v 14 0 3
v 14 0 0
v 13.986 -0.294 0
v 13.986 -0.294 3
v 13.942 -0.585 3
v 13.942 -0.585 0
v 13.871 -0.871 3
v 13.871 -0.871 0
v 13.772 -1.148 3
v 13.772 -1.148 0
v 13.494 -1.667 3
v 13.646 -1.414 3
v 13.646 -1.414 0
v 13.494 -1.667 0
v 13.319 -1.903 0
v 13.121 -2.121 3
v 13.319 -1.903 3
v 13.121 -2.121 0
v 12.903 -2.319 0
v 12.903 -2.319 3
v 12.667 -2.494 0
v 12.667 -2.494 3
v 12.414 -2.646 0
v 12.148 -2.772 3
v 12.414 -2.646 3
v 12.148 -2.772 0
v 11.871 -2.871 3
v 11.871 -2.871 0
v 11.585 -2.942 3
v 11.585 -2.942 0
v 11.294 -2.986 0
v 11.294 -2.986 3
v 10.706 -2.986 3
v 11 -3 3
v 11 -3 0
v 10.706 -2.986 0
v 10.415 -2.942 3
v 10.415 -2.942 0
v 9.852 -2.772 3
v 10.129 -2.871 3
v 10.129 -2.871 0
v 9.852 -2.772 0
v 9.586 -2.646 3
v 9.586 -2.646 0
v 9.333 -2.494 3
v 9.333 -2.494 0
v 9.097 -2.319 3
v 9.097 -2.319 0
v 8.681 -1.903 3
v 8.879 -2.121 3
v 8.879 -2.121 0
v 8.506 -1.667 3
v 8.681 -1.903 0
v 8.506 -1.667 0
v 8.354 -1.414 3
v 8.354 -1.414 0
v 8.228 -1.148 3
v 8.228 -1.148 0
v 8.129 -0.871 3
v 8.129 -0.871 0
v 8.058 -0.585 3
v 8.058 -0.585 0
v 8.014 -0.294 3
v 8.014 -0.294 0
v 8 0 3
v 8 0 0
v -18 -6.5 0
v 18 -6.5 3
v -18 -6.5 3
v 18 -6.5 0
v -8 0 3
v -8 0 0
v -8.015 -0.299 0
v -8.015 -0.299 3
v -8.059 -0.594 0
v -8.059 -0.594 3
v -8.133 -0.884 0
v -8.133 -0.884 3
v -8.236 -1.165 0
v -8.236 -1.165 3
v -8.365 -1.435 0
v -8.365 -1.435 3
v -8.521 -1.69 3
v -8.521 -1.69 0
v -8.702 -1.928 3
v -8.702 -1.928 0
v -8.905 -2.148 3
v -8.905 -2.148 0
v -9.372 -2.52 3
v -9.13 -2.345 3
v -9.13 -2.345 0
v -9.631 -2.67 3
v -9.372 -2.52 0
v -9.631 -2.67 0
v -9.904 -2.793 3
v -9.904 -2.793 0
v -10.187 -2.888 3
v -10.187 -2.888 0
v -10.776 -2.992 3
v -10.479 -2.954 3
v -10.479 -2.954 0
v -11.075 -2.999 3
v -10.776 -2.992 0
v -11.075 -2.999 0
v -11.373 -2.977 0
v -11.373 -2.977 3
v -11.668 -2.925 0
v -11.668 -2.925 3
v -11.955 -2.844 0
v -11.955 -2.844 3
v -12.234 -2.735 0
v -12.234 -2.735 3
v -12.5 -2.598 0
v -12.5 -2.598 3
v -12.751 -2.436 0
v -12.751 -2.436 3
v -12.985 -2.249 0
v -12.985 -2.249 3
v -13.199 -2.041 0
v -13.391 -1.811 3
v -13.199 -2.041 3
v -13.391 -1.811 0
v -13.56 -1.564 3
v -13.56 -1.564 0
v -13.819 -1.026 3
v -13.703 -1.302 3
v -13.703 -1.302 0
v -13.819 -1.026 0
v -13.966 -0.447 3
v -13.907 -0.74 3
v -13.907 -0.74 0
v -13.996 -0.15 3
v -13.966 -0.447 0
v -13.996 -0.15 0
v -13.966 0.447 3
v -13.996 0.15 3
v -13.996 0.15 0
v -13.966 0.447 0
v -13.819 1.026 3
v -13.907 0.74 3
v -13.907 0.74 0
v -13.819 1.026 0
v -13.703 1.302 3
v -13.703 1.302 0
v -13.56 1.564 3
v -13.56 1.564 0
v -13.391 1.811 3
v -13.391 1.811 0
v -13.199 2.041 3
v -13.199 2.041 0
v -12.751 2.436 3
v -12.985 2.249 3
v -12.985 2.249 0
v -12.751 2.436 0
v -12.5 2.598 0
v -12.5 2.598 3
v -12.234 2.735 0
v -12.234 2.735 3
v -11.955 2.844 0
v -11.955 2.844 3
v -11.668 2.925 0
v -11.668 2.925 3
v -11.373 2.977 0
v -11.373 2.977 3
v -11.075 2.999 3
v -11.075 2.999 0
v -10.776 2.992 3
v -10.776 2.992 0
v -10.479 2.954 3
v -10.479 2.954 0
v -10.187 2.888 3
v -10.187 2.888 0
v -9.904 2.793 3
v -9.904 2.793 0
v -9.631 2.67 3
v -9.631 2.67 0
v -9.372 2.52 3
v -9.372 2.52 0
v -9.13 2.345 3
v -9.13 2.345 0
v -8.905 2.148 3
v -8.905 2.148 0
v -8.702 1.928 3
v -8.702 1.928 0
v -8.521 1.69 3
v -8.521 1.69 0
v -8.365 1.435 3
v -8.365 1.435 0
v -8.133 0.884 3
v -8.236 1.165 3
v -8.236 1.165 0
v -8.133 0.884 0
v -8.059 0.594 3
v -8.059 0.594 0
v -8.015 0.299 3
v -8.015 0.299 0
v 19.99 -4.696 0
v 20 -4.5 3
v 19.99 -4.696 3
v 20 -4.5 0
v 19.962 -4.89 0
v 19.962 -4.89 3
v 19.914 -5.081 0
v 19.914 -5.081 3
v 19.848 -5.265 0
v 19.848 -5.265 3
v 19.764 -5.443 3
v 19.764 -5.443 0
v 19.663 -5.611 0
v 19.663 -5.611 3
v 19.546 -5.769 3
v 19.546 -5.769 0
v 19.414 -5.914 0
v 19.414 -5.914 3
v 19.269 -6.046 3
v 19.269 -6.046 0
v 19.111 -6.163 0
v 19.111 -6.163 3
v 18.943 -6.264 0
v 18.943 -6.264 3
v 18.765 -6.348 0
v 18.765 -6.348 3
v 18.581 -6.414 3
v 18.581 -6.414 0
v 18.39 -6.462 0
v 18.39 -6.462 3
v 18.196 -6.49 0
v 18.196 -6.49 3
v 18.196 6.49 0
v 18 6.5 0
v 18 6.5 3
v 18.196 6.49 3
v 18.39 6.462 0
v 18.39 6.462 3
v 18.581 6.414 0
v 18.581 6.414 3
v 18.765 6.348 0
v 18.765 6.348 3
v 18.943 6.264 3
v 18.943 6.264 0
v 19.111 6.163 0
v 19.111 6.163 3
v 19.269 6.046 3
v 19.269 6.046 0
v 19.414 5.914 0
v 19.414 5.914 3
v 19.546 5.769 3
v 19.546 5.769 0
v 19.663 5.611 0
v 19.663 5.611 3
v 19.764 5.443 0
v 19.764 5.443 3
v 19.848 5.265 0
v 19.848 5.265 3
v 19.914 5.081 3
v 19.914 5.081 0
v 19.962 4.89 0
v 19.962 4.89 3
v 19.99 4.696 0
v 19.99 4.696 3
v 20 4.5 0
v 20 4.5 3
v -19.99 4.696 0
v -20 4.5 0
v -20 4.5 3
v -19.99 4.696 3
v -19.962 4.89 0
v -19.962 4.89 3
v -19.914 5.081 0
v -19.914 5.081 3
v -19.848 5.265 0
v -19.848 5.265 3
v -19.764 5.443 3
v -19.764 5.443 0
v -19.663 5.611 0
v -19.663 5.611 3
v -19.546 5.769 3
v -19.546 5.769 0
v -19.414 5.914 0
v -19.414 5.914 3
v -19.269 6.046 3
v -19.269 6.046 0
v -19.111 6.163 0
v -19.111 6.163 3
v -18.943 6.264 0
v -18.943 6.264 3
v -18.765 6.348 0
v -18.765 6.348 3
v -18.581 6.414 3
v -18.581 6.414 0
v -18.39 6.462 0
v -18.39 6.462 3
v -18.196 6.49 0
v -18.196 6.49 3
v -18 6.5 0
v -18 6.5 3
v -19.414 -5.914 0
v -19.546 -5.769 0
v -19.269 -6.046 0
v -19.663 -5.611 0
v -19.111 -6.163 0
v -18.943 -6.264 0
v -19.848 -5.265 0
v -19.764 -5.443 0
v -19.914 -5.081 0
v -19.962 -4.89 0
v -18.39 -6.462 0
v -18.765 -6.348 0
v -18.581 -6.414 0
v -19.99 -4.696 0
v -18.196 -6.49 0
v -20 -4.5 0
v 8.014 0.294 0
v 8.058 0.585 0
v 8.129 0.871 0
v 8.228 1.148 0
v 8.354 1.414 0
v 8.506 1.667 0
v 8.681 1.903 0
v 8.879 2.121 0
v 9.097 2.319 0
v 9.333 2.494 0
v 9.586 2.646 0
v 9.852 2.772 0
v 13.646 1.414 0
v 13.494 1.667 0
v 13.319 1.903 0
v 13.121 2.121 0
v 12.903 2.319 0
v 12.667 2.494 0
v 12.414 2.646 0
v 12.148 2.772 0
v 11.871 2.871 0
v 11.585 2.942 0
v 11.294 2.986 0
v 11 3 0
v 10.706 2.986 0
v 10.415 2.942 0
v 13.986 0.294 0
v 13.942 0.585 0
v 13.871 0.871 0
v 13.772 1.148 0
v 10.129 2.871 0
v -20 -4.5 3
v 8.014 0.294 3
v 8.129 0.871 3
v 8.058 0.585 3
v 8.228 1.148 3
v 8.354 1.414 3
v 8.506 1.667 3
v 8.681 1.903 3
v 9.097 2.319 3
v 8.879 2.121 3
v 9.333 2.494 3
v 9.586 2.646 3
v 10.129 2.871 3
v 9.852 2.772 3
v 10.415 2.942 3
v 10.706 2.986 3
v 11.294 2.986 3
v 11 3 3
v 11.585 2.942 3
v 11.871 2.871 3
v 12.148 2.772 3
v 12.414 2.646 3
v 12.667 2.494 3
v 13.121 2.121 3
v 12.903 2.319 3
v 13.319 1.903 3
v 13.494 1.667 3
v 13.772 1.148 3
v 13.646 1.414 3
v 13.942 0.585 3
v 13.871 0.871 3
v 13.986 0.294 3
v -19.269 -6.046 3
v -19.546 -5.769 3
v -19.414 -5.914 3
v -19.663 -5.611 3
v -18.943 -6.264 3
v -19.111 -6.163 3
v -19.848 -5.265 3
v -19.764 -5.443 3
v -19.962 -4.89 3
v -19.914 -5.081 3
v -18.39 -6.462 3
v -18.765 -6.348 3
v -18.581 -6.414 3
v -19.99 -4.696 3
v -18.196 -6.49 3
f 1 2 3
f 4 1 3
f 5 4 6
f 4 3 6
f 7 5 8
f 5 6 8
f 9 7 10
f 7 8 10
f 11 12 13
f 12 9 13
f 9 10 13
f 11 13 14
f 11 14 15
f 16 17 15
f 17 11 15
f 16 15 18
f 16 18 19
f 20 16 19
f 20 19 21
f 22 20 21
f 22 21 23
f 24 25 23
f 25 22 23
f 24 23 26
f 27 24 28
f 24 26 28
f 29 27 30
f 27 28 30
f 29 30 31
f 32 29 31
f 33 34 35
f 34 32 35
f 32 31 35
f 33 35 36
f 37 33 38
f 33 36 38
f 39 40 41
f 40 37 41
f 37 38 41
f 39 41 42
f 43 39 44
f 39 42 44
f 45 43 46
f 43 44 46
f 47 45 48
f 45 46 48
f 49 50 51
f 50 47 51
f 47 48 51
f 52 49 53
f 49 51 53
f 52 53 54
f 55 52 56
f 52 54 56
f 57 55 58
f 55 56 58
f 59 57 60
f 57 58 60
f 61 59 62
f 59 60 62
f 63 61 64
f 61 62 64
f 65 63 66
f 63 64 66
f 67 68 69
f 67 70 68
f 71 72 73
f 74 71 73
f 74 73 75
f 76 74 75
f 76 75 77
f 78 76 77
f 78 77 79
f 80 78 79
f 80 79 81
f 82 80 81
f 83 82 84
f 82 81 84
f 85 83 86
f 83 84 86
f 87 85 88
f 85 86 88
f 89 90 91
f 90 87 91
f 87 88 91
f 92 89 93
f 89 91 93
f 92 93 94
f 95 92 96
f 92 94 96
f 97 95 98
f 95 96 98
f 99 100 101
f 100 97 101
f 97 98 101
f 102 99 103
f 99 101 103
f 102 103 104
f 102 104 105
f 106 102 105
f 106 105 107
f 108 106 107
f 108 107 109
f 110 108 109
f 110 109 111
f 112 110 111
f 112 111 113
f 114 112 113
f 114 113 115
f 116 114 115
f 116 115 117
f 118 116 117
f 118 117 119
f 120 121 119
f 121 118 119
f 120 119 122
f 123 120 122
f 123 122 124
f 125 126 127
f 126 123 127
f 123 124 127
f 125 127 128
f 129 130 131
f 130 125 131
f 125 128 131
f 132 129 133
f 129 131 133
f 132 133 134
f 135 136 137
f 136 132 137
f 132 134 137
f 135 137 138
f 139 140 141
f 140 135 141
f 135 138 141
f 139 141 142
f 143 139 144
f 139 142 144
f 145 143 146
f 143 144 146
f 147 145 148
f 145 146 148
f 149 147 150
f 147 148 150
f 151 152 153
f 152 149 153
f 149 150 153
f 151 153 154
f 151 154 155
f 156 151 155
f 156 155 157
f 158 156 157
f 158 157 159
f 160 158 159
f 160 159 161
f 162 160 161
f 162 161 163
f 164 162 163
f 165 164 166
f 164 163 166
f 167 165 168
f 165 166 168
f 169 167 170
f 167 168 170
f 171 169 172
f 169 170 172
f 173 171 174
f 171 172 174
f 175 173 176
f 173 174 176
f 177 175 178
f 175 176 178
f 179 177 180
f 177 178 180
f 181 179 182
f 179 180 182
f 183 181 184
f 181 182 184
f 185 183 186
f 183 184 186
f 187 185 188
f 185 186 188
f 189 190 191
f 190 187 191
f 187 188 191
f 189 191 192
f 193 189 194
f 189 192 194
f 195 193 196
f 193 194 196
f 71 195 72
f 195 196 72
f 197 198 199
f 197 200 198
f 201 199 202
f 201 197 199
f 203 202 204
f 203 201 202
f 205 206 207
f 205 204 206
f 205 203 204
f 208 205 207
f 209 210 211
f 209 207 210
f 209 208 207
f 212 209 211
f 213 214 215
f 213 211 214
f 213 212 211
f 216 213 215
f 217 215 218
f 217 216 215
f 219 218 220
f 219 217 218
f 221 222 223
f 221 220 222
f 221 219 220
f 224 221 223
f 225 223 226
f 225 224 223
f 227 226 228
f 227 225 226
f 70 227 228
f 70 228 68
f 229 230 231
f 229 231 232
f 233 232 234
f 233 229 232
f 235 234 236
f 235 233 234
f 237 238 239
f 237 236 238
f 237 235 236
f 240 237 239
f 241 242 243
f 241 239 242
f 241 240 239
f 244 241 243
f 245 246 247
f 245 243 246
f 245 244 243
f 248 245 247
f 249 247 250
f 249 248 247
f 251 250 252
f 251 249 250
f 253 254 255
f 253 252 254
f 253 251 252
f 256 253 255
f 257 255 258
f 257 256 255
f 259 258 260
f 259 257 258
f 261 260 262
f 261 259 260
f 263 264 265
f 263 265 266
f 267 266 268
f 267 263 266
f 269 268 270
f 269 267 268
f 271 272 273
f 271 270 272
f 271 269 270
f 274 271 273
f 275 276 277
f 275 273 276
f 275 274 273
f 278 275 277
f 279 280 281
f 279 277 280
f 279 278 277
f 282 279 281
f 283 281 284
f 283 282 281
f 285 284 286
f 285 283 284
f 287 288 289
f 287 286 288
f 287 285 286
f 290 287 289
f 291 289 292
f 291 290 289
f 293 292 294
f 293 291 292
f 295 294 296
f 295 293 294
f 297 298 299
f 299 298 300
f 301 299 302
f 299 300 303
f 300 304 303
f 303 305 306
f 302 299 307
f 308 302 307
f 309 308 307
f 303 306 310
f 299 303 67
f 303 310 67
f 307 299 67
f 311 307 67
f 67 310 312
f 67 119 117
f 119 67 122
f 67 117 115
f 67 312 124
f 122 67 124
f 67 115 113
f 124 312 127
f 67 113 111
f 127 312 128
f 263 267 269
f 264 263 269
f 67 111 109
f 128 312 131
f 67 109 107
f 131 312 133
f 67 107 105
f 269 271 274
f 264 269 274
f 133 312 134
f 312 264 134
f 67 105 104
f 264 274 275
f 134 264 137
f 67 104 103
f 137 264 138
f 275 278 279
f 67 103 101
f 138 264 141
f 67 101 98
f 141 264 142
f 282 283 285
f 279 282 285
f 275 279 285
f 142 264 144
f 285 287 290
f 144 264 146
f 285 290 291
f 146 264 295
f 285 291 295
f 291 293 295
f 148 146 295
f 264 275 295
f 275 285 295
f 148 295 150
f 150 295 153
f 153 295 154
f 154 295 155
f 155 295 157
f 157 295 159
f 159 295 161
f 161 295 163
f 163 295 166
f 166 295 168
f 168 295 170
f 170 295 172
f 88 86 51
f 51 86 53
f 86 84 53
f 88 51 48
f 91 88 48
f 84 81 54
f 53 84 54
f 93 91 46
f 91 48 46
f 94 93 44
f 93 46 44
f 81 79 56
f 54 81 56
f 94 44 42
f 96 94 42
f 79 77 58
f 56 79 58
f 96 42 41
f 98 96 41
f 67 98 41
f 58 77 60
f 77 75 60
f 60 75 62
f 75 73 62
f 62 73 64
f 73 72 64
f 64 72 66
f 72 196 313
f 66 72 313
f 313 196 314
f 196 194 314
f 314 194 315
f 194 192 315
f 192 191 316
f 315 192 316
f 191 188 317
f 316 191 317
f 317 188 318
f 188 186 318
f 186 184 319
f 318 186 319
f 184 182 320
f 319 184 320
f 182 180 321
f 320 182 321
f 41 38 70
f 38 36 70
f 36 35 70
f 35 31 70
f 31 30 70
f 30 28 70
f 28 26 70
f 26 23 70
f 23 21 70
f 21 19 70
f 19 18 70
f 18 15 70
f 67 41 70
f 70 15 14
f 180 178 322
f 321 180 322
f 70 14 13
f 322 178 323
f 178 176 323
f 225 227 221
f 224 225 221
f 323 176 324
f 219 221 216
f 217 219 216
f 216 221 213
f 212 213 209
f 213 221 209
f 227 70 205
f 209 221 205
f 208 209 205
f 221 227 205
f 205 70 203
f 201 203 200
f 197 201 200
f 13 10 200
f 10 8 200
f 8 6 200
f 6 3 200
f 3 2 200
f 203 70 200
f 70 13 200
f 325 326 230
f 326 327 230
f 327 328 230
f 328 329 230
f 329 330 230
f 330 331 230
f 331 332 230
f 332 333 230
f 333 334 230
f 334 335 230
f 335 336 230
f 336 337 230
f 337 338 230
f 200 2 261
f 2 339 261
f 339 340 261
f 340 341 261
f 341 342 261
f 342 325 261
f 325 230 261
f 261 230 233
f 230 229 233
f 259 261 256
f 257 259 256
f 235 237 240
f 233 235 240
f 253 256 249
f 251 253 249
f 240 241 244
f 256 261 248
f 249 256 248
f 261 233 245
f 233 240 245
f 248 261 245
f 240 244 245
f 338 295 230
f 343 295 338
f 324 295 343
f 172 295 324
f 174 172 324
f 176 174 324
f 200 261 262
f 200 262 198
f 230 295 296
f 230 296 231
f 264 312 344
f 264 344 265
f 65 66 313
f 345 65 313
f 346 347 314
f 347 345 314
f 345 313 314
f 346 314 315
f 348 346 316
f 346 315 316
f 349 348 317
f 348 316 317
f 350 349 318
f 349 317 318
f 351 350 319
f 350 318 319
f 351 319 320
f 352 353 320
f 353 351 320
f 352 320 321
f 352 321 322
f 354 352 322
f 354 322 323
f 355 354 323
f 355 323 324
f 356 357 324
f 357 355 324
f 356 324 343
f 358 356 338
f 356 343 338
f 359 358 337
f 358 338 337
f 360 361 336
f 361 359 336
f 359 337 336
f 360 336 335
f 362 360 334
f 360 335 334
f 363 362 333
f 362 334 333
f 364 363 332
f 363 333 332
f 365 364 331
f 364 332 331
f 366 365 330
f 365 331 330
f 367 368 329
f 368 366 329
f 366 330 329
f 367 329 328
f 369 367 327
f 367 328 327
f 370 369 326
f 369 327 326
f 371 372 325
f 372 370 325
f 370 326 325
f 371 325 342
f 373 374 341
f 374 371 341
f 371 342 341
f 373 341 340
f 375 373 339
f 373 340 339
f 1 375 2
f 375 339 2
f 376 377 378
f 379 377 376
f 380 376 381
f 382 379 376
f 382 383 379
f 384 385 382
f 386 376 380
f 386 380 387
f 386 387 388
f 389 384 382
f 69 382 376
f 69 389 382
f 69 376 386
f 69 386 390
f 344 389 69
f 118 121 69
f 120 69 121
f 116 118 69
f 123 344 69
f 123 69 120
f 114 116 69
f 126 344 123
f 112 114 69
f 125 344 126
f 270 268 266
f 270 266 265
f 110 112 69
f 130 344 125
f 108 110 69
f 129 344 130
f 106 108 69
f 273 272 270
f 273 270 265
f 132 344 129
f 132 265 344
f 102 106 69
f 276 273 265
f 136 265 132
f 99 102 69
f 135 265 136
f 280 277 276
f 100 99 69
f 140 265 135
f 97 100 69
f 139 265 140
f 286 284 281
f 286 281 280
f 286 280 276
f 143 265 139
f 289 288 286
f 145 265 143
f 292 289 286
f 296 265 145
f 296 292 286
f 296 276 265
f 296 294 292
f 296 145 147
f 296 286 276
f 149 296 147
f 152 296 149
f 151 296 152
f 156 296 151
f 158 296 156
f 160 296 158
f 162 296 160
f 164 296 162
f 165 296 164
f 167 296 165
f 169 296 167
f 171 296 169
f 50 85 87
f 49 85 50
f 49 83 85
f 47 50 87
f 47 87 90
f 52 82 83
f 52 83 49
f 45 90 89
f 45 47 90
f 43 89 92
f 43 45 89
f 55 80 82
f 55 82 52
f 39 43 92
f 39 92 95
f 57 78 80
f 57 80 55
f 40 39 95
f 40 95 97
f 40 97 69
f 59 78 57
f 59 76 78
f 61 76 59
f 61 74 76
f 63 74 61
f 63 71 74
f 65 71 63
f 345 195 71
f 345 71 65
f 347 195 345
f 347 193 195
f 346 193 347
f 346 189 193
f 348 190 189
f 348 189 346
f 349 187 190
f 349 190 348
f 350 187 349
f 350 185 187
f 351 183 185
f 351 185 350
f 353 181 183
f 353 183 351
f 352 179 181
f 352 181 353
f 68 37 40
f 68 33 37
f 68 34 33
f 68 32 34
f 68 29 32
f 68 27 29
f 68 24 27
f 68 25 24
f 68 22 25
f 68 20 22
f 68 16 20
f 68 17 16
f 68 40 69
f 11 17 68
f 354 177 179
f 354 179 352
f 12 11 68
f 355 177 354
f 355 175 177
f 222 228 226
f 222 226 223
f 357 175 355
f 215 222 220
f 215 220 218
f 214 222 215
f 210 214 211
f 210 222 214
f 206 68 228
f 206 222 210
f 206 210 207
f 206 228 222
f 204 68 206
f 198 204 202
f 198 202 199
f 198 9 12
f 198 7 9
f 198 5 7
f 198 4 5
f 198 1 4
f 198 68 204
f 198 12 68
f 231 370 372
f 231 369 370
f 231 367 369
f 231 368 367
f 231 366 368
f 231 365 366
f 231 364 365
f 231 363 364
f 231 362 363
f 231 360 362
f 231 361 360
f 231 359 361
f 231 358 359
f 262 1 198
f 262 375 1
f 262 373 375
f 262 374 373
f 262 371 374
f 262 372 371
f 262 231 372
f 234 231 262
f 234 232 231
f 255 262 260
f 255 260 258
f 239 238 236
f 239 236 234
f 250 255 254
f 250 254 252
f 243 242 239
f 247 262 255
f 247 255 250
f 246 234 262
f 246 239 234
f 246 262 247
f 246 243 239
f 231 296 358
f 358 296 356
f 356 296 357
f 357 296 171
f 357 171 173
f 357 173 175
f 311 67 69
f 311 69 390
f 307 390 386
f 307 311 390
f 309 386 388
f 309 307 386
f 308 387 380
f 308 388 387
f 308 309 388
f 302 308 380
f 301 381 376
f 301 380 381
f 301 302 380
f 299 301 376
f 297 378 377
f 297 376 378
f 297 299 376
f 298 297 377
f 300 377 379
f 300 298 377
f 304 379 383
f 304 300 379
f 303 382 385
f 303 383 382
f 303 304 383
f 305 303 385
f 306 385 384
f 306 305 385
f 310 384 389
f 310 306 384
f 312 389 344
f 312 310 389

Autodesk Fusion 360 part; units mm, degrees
sketch "Sketch1" plane through (0, 0, 0) normal (0, 0, 1) x (1, 0, 0)
  line L0 (18, -6.5) -> (-18, -6.5)
  line L1 (-20, -4.5) -> (-20, 4.5)
  line L2 (-18, 6.5) -> (18, 6.5)
  line L3 (20, 4.5) -> (20, -4.5)
  line L4 (20, -6.5) -> (-20, 6.5) construction
  line L5 (-20, -6.5) -> (20, 6.5) construction
  arc A0 (20, 4.5) -> (18, 6.5) centre (18, 4.5) ccw
  arc A1 (18, -6.5) -> (20, -4.5) centre (18, -4.5) ccw
  arc A2 (-20, -4.5) -> (-18, -6.5) centre (-18, -4.5) ccw
  arc A3 (-18, 6.5) -> (-20, 4.5) centre (-18, 4.5) ccw
  line L6 (0, 0) -> (11, 0)
  line L7 (0, 0) -> (-11, 0) construction
  circle A4 centre (11, 0) radius 3
  circle A5 centre (-11, 0) radius 3
  dimension "d1" = 40
  dimension "d2" = 13
  dimension "d3" = 2
  dimension "d4" = 11
  dimension "d5" = 11
  dimension "d6" = 6
  dimension "d7" = 6
extrude "Extrude1" add sketch "Sketch1" along normal blind 3
